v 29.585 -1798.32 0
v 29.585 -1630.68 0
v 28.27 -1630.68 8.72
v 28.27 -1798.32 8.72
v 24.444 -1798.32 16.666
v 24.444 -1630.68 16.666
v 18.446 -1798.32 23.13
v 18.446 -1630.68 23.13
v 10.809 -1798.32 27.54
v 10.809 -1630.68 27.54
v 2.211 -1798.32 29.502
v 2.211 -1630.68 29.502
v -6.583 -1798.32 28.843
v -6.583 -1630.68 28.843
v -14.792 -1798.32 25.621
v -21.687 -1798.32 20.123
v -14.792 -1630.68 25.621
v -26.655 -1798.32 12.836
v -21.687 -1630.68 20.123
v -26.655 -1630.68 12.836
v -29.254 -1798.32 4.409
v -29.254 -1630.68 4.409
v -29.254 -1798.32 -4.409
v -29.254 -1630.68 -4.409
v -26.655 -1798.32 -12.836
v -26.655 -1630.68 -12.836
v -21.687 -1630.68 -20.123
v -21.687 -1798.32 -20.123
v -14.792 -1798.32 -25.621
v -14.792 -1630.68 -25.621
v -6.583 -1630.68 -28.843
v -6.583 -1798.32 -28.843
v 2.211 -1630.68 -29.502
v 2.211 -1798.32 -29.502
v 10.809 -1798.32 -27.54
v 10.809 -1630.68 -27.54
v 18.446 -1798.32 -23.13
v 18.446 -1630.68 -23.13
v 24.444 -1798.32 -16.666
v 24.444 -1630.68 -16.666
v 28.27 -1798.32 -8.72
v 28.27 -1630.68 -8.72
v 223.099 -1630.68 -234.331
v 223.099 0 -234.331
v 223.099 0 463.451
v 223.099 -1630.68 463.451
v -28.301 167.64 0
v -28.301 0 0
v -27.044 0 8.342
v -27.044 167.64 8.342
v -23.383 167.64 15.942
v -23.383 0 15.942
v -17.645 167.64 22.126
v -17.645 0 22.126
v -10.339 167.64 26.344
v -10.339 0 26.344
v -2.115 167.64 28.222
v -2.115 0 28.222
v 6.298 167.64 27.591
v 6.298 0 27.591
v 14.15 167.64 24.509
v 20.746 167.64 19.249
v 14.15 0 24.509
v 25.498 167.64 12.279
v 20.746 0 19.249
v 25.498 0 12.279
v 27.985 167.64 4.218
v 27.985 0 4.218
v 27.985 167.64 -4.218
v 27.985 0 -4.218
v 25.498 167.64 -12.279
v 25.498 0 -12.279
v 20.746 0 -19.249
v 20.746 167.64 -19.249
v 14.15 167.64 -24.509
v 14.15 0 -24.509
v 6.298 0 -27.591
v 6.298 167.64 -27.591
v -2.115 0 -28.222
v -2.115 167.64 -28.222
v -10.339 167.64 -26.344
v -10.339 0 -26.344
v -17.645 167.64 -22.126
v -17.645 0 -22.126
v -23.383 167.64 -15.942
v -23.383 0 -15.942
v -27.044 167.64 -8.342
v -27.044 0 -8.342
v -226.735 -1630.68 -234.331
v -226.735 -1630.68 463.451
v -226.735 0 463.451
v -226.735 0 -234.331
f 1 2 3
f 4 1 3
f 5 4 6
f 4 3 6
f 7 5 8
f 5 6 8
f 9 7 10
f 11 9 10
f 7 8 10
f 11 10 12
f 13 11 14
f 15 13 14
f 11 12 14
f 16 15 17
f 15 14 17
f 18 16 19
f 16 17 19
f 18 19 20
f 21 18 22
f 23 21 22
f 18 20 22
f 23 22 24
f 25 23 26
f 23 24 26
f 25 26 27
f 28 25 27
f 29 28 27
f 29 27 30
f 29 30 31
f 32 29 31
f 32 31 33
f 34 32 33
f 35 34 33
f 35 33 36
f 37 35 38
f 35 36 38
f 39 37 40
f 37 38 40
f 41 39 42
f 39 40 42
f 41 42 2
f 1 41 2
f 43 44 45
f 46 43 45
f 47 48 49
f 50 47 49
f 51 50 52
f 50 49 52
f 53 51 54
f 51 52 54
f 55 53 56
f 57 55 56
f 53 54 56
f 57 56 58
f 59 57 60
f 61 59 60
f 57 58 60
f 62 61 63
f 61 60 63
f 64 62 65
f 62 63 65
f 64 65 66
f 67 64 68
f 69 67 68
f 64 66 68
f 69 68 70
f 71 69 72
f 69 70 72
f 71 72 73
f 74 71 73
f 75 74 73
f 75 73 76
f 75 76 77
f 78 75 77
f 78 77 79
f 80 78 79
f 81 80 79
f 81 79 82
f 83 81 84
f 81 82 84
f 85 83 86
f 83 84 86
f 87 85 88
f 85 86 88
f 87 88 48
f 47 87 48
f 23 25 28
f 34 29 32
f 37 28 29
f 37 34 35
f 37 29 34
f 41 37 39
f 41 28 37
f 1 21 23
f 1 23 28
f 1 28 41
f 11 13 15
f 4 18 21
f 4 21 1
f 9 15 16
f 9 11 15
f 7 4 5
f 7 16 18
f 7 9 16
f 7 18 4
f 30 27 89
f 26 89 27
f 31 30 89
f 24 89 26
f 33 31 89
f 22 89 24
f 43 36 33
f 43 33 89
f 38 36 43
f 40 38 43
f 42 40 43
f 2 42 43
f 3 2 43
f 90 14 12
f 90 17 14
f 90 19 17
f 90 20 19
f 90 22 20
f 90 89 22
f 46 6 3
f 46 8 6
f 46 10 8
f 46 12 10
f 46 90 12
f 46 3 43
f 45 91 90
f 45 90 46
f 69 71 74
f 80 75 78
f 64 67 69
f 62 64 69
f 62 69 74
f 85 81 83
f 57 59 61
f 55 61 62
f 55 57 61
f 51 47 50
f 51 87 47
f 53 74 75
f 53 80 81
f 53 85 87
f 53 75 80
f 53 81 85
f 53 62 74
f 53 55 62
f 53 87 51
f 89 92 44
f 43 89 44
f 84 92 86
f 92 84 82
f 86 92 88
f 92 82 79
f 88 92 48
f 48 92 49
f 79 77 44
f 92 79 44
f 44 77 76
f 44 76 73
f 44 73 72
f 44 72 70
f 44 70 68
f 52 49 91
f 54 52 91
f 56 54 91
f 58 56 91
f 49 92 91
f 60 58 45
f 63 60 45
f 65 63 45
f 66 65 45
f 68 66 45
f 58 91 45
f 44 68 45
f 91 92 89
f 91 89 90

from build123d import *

# Parameters (mm, degrees)
F0_W     = 449.834
F0_H     = 697.781688
F1_DEPTH = 1630.68
F2_R     = 29.584786
F3_DEPTH = 167.64
F4_R     = 28.30083
F5_DEPTH = 167.64


with BuildPart() as f1:
    # F0 (on Front) → F1 (new body)
    with BuildSketch(Plane.XZ):
        with Locations((-1.818407, 114.559772)):
            Rectangle(F0_W, F0_H)
    extrude(amount=F1_DEPTH)

    # F2 (on face) → F3 (join)
    with BuildSketch(Plane.XZ.offset(1630.68)):
        Circle(F2_R)
    extrude(amount=F3_DEPTH)

    # F4 (on face) → F5 (join)
    with BuildSketch(Plane(origin=(0, 0, 0), x_dir=(-1, 0, 0), z_dir=(0, 1, 0))):
        Circle(F4_R)
    extrude(amount=F5_DEPTH)


solid = f1.part
